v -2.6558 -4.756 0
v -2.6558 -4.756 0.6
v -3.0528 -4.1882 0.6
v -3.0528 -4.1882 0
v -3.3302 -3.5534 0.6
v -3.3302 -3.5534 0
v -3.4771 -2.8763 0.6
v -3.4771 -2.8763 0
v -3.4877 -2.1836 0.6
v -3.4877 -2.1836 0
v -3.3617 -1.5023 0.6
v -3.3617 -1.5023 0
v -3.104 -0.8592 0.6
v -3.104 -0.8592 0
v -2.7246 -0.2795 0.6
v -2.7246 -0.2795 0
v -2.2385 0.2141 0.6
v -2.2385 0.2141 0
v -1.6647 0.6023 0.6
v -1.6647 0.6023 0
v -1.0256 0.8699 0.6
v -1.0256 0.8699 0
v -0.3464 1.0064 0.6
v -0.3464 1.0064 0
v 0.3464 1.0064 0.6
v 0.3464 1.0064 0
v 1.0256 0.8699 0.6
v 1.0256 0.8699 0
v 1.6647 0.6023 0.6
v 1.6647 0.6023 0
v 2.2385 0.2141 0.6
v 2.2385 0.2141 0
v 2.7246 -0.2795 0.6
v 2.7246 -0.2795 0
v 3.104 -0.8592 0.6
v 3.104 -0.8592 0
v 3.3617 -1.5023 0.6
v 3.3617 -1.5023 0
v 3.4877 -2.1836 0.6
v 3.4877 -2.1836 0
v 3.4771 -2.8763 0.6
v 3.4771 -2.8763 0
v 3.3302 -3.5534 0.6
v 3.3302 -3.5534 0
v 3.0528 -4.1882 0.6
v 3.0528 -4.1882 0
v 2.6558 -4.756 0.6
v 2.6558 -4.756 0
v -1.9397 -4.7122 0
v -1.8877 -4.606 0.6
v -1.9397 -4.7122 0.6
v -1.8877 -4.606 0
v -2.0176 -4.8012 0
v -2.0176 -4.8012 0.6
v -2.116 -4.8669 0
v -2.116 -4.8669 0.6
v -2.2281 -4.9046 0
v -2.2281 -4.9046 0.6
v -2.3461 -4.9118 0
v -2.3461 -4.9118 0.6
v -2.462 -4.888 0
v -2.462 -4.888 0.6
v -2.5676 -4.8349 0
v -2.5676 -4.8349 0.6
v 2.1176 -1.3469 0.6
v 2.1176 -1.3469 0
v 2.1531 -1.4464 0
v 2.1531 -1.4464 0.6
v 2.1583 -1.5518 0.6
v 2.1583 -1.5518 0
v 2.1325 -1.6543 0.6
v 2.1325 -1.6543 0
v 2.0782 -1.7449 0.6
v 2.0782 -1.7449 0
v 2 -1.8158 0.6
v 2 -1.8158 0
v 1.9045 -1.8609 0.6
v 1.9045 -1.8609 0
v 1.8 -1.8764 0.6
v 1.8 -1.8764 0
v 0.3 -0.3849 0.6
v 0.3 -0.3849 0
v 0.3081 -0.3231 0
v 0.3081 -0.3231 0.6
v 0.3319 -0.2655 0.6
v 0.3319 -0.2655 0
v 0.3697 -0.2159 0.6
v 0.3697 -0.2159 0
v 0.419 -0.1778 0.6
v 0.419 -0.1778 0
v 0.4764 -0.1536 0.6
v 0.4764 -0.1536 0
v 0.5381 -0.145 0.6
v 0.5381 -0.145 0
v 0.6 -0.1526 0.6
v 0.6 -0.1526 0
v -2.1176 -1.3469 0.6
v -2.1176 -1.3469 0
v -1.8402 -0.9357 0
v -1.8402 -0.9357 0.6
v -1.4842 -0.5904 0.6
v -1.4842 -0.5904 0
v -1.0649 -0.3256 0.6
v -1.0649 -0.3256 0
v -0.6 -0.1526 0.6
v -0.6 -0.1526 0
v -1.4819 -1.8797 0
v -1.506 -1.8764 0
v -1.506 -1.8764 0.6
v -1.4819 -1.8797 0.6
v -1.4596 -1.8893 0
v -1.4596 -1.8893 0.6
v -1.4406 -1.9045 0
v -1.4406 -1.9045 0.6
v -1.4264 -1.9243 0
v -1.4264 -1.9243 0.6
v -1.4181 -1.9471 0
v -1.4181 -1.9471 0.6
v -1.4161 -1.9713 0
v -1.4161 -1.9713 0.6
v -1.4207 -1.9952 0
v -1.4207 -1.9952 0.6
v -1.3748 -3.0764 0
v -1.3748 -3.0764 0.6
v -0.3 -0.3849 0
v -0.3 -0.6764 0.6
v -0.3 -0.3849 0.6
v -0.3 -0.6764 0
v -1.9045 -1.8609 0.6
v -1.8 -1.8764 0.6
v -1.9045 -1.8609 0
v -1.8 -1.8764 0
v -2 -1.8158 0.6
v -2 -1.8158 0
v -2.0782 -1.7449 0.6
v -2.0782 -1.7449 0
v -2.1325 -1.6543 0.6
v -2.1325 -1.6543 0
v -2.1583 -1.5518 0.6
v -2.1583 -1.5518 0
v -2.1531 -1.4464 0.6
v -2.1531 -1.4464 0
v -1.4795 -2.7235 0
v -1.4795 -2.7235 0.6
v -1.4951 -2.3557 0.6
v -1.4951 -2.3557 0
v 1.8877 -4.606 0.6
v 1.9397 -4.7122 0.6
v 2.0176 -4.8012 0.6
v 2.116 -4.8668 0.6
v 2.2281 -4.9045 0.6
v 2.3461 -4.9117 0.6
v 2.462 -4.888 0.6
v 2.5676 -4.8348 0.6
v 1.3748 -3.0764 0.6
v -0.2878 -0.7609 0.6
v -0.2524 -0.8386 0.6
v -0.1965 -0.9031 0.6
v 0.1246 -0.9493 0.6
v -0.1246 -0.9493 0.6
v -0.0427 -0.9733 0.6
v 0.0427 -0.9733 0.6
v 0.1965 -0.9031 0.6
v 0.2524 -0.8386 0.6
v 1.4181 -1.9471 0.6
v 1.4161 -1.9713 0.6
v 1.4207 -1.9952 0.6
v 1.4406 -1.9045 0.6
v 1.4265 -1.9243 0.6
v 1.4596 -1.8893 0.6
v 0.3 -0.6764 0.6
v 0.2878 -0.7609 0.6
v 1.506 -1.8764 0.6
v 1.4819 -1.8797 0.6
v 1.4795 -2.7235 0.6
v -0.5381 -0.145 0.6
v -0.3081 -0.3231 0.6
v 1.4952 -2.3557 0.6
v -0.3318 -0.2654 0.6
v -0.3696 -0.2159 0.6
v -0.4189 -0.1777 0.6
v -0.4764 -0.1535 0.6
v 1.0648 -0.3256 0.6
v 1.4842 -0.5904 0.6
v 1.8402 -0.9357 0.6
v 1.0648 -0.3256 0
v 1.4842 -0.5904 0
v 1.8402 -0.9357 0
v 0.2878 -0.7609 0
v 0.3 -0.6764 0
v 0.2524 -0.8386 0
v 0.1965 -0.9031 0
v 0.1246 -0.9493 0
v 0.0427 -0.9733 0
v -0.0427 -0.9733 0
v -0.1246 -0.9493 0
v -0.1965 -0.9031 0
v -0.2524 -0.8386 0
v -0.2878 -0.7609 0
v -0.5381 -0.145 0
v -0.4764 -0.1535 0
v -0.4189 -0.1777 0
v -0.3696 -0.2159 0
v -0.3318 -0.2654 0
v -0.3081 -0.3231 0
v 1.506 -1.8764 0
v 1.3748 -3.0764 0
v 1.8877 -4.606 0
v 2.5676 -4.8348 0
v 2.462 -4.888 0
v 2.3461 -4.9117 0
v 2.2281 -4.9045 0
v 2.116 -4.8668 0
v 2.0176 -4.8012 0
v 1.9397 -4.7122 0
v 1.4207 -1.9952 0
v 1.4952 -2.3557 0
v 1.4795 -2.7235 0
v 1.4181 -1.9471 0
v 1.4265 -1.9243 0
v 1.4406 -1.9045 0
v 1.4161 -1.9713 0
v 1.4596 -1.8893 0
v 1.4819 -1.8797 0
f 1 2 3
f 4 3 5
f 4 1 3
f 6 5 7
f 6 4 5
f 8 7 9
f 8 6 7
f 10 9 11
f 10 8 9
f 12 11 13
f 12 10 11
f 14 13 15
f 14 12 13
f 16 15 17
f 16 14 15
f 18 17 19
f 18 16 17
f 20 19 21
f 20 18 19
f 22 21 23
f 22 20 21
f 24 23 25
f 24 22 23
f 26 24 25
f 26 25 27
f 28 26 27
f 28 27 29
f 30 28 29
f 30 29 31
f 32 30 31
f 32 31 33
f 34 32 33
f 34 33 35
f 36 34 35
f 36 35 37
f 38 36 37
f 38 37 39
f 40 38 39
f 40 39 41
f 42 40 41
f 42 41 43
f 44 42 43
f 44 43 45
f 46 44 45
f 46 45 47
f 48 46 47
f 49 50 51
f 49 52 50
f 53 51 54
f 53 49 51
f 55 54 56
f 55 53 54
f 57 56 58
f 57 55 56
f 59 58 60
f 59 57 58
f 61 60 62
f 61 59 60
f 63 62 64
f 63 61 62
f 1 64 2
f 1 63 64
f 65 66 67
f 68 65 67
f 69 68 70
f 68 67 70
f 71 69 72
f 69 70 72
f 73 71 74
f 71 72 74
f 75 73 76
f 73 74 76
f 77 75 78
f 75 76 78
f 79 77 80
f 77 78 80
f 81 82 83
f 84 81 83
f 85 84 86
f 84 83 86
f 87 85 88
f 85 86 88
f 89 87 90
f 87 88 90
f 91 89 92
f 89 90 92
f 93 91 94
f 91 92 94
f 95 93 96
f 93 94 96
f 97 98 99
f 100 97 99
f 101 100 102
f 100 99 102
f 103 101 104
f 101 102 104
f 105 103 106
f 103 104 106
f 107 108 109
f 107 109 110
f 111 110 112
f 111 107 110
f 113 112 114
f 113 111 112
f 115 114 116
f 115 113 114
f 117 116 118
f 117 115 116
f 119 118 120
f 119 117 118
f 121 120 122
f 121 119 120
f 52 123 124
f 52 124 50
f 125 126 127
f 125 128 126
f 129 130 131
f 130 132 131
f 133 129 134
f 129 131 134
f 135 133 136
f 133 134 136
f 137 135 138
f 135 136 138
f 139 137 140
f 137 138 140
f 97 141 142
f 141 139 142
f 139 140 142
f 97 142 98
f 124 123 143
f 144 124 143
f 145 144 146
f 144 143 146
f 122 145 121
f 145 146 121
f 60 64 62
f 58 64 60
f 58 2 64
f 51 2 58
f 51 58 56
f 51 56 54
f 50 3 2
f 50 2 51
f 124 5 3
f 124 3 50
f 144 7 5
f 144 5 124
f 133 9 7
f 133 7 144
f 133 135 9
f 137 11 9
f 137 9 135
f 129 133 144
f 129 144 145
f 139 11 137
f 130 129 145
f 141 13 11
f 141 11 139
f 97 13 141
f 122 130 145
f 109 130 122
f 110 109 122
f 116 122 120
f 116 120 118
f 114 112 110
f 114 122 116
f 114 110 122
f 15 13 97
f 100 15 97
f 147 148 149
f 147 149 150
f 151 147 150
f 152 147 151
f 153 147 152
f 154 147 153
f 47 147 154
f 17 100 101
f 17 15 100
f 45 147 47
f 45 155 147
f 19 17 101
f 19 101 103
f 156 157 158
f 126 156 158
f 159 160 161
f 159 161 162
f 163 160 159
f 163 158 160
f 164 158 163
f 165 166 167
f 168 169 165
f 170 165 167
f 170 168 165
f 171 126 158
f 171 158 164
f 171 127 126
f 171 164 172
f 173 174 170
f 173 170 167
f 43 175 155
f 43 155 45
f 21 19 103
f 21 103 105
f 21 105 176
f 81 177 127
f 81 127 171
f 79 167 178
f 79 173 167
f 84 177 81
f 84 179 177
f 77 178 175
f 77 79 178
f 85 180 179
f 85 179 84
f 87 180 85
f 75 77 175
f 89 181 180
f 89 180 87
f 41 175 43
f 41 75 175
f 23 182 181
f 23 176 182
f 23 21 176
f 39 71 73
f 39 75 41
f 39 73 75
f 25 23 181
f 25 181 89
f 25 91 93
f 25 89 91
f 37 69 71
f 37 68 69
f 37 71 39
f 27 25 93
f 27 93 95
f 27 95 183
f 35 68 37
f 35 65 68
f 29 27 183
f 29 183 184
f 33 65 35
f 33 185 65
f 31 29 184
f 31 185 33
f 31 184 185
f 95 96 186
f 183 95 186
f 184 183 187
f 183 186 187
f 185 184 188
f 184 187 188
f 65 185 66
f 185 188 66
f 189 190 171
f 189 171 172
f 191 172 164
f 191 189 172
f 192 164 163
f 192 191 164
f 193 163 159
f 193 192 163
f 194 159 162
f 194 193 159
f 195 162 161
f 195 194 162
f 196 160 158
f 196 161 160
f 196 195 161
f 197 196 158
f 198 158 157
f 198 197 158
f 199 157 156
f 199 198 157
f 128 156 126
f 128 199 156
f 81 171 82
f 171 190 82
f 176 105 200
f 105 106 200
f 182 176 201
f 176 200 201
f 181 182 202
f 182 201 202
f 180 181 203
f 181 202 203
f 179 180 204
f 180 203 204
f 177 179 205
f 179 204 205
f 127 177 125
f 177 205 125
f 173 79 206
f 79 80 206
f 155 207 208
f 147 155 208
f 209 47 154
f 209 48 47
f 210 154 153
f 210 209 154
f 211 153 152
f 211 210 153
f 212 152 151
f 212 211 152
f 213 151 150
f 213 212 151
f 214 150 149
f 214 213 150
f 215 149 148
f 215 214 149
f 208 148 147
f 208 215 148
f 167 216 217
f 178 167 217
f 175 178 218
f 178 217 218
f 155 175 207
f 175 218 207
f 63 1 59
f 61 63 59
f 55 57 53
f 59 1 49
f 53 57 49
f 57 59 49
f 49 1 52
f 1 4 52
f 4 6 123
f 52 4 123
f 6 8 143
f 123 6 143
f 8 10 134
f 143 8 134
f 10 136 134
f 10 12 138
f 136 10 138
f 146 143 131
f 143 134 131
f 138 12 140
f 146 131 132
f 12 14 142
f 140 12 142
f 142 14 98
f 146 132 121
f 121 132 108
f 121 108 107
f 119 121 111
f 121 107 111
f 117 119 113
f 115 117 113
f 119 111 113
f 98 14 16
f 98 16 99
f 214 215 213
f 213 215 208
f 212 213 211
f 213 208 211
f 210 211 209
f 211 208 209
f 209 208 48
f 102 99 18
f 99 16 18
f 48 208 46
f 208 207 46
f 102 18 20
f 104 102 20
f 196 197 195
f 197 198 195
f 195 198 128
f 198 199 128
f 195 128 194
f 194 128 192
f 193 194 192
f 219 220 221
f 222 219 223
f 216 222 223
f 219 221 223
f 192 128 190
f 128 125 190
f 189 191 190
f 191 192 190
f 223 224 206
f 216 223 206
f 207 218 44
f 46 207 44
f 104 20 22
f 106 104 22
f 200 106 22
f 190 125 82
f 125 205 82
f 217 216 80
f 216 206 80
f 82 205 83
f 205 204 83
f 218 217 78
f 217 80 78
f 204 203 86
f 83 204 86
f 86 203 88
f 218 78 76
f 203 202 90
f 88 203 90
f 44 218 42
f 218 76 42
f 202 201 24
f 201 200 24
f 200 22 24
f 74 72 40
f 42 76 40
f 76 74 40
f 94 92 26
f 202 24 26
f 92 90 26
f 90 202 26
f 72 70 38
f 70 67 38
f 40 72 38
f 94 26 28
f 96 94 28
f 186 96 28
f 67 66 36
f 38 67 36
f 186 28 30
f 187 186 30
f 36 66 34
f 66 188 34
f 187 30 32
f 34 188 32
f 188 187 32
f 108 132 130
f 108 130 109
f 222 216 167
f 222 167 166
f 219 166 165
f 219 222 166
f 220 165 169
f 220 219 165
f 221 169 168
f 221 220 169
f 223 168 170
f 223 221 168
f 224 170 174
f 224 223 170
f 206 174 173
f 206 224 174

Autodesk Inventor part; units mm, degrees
ref_plane "YZ Plane" through (0, 0, 0) normal (1, 0, 0) x (0, 1, 0)
ref_plane "XZ Plane" through (0, 0, 0) normal (0, 1, 0) x (-1, 0, 0)
sketch "Esquisse1" plane through (0, 0, 0) normal (0, 0, 1) x (1, 0, 0)
  circle A0 centre (0, -2.4764) radius 2.5 construction
  line L0 (-0.3, 0.0236) -> (0, 0.0236) construction
  line L1 (-3.206, 0) -> (3.4858, 0) projected
  line L2 (-1.3748, -3.0764) -> (1.3748, -3.0764) construction
  arc A1 (-1.4207, -1.9952) -> (-1.3748, -3.0764) centre (0, -2.4764) ccw
  line L3 (0, 1.949) -> (0, -3.4788) projected
  arc A2 (-0.3, -0.6764) -> (0.3, -0.6764) centre (0, -0.6764) ccw
  arc A3 (2.6558, -4.756) -> (-2.6558, -4.756) centre (0, -2.4764) ccw
  line L4 (-1.8, -1.8764) -> (-1.506, -1.8764)
  line L5 (-0.3, -0.6764) -> (-0.3, -0.3849)
  arc A4 (-0.6, -0.1526) -> (-2.1176, -1.3469) centre (0, -2.4764) ccw
  arc A5 (-0.3, -0.3849) -> (-0.6, -0.1526) centre (-0.54, -0.3849) ccw
  arc A6 (-2.1176, -1.3469) -> (-1.8, -1.8764) centre (-1.8, -1.5164) ccw
  arc A7 (-1.4207, -1.9952) -> (-1.506, -1.8764) centre (-1.506, -1.9664) ccw
  line L6 (0, 1.0236) -> (2.5298, 1.0236) construction
  line L7 (-1.3748, -3.0764) -> (-1.8877, -4.606)
  arc A8 (-2.6558, -4.756) -> (-1.8877, -4.606) centre (-2.3143, -4.4629) ccw
  line L8 (0, -0.9764) -> (-1.2778, -0.9764) construction
  line L9 (1.3748, -3.0764) -> (1.8877, -4.606)
  arc A9 (1.8877, -4.606) -> (2.6558, -4.756) centre (2.3143, -4.4629) ccw
  arc A10 (1.3748, -3.0764) -> (1.4207, -1.9952) centre (0, -2.4764) ccw
  line L10 (1.8, -1.8764) -> (1.506, -1.8764)
  line L11 (0.3, -0.6764) -> (0.3, -0.3849)
  arc A11 (2.1176, -1.3469) -> (0.6, -0.1526) centre (0, -2.4764) ccw
  arc A12 (0.6, -0.1526) -> (0.3, -0.3849) centre (0.54, -0.3849) ccw
  arc A13 (1.8, -1.8764) -> (2.1176, -1.3469) centre (1.8, -1.5164) ccw
  arc A14 (1.506, -1.8764) -> (1.4207, -1.9952) centre (1.506, -1.9664) ccw
  point P0 (0.3, 0.0236)
  dimension "d0" = 5
  dimension "d3" = 0.6
  dimension "d4" = 0.3
  dimension "d5" = 7
  dimension "d8" = 2.4
  dimension "d9" = 0.6
  dimension "d10" = 0.24
  dimension "d11" = 0.36
  dimension "d12" = 0.09
  dimension "d13" = 0.45
  dimension "d14" = 1.5
  dimension "d15" = 1.5
extrude "Corps" add sketch "Esquisse1" along normal blind 0.6
ref_plane "Work Plane1" through (0, -2.4764, 0) normal (-1, 0, 0) x (0, 0, 1)
equation "\"d0\" = WD"
equation "\"d3\" = 0.2 * NND"
equation "\"d4\" = 0.1 * NND"
equation "\"d5\" = SD2"
equation "\"d8\" = 0.8 * NND"
equation "\"d9\" = 0.2 * NND"
equation "\"d10\" = 0.08 * NND"
equation "\"d11\" = 0.12 * NND"
equation "\"d12\" = 0.03 * NND"
equation "\"d13\" = 0.15 * NND"
equation "\"d14\" = 0.5 * NND"
equation "\"d15\" = 0.5 * NND"
equation "\"d16\" = SD"
equation "\"ND\" = 3.05"
equation "\"SD\" = 0.6"
equation "\"WD\" = 5"
equation "\"d1\" = 1.6 * NND"
equation "\"d2\" = NND"
equation "\"SD2\" = 7"
equation "\"d6\" = NND"
equation "\"d7\" = 0.15 * NND"
equation "\"NND\" = 3"
equation "\"WDMIN\" = 4"
equation "\"SNB\" = 0.7"
equation "\"WDMAX\" = 5"
equation "\"BUBRMI\" = 1"
properties part number "JIS B 2804 E - 3" material "Acier, doux"
